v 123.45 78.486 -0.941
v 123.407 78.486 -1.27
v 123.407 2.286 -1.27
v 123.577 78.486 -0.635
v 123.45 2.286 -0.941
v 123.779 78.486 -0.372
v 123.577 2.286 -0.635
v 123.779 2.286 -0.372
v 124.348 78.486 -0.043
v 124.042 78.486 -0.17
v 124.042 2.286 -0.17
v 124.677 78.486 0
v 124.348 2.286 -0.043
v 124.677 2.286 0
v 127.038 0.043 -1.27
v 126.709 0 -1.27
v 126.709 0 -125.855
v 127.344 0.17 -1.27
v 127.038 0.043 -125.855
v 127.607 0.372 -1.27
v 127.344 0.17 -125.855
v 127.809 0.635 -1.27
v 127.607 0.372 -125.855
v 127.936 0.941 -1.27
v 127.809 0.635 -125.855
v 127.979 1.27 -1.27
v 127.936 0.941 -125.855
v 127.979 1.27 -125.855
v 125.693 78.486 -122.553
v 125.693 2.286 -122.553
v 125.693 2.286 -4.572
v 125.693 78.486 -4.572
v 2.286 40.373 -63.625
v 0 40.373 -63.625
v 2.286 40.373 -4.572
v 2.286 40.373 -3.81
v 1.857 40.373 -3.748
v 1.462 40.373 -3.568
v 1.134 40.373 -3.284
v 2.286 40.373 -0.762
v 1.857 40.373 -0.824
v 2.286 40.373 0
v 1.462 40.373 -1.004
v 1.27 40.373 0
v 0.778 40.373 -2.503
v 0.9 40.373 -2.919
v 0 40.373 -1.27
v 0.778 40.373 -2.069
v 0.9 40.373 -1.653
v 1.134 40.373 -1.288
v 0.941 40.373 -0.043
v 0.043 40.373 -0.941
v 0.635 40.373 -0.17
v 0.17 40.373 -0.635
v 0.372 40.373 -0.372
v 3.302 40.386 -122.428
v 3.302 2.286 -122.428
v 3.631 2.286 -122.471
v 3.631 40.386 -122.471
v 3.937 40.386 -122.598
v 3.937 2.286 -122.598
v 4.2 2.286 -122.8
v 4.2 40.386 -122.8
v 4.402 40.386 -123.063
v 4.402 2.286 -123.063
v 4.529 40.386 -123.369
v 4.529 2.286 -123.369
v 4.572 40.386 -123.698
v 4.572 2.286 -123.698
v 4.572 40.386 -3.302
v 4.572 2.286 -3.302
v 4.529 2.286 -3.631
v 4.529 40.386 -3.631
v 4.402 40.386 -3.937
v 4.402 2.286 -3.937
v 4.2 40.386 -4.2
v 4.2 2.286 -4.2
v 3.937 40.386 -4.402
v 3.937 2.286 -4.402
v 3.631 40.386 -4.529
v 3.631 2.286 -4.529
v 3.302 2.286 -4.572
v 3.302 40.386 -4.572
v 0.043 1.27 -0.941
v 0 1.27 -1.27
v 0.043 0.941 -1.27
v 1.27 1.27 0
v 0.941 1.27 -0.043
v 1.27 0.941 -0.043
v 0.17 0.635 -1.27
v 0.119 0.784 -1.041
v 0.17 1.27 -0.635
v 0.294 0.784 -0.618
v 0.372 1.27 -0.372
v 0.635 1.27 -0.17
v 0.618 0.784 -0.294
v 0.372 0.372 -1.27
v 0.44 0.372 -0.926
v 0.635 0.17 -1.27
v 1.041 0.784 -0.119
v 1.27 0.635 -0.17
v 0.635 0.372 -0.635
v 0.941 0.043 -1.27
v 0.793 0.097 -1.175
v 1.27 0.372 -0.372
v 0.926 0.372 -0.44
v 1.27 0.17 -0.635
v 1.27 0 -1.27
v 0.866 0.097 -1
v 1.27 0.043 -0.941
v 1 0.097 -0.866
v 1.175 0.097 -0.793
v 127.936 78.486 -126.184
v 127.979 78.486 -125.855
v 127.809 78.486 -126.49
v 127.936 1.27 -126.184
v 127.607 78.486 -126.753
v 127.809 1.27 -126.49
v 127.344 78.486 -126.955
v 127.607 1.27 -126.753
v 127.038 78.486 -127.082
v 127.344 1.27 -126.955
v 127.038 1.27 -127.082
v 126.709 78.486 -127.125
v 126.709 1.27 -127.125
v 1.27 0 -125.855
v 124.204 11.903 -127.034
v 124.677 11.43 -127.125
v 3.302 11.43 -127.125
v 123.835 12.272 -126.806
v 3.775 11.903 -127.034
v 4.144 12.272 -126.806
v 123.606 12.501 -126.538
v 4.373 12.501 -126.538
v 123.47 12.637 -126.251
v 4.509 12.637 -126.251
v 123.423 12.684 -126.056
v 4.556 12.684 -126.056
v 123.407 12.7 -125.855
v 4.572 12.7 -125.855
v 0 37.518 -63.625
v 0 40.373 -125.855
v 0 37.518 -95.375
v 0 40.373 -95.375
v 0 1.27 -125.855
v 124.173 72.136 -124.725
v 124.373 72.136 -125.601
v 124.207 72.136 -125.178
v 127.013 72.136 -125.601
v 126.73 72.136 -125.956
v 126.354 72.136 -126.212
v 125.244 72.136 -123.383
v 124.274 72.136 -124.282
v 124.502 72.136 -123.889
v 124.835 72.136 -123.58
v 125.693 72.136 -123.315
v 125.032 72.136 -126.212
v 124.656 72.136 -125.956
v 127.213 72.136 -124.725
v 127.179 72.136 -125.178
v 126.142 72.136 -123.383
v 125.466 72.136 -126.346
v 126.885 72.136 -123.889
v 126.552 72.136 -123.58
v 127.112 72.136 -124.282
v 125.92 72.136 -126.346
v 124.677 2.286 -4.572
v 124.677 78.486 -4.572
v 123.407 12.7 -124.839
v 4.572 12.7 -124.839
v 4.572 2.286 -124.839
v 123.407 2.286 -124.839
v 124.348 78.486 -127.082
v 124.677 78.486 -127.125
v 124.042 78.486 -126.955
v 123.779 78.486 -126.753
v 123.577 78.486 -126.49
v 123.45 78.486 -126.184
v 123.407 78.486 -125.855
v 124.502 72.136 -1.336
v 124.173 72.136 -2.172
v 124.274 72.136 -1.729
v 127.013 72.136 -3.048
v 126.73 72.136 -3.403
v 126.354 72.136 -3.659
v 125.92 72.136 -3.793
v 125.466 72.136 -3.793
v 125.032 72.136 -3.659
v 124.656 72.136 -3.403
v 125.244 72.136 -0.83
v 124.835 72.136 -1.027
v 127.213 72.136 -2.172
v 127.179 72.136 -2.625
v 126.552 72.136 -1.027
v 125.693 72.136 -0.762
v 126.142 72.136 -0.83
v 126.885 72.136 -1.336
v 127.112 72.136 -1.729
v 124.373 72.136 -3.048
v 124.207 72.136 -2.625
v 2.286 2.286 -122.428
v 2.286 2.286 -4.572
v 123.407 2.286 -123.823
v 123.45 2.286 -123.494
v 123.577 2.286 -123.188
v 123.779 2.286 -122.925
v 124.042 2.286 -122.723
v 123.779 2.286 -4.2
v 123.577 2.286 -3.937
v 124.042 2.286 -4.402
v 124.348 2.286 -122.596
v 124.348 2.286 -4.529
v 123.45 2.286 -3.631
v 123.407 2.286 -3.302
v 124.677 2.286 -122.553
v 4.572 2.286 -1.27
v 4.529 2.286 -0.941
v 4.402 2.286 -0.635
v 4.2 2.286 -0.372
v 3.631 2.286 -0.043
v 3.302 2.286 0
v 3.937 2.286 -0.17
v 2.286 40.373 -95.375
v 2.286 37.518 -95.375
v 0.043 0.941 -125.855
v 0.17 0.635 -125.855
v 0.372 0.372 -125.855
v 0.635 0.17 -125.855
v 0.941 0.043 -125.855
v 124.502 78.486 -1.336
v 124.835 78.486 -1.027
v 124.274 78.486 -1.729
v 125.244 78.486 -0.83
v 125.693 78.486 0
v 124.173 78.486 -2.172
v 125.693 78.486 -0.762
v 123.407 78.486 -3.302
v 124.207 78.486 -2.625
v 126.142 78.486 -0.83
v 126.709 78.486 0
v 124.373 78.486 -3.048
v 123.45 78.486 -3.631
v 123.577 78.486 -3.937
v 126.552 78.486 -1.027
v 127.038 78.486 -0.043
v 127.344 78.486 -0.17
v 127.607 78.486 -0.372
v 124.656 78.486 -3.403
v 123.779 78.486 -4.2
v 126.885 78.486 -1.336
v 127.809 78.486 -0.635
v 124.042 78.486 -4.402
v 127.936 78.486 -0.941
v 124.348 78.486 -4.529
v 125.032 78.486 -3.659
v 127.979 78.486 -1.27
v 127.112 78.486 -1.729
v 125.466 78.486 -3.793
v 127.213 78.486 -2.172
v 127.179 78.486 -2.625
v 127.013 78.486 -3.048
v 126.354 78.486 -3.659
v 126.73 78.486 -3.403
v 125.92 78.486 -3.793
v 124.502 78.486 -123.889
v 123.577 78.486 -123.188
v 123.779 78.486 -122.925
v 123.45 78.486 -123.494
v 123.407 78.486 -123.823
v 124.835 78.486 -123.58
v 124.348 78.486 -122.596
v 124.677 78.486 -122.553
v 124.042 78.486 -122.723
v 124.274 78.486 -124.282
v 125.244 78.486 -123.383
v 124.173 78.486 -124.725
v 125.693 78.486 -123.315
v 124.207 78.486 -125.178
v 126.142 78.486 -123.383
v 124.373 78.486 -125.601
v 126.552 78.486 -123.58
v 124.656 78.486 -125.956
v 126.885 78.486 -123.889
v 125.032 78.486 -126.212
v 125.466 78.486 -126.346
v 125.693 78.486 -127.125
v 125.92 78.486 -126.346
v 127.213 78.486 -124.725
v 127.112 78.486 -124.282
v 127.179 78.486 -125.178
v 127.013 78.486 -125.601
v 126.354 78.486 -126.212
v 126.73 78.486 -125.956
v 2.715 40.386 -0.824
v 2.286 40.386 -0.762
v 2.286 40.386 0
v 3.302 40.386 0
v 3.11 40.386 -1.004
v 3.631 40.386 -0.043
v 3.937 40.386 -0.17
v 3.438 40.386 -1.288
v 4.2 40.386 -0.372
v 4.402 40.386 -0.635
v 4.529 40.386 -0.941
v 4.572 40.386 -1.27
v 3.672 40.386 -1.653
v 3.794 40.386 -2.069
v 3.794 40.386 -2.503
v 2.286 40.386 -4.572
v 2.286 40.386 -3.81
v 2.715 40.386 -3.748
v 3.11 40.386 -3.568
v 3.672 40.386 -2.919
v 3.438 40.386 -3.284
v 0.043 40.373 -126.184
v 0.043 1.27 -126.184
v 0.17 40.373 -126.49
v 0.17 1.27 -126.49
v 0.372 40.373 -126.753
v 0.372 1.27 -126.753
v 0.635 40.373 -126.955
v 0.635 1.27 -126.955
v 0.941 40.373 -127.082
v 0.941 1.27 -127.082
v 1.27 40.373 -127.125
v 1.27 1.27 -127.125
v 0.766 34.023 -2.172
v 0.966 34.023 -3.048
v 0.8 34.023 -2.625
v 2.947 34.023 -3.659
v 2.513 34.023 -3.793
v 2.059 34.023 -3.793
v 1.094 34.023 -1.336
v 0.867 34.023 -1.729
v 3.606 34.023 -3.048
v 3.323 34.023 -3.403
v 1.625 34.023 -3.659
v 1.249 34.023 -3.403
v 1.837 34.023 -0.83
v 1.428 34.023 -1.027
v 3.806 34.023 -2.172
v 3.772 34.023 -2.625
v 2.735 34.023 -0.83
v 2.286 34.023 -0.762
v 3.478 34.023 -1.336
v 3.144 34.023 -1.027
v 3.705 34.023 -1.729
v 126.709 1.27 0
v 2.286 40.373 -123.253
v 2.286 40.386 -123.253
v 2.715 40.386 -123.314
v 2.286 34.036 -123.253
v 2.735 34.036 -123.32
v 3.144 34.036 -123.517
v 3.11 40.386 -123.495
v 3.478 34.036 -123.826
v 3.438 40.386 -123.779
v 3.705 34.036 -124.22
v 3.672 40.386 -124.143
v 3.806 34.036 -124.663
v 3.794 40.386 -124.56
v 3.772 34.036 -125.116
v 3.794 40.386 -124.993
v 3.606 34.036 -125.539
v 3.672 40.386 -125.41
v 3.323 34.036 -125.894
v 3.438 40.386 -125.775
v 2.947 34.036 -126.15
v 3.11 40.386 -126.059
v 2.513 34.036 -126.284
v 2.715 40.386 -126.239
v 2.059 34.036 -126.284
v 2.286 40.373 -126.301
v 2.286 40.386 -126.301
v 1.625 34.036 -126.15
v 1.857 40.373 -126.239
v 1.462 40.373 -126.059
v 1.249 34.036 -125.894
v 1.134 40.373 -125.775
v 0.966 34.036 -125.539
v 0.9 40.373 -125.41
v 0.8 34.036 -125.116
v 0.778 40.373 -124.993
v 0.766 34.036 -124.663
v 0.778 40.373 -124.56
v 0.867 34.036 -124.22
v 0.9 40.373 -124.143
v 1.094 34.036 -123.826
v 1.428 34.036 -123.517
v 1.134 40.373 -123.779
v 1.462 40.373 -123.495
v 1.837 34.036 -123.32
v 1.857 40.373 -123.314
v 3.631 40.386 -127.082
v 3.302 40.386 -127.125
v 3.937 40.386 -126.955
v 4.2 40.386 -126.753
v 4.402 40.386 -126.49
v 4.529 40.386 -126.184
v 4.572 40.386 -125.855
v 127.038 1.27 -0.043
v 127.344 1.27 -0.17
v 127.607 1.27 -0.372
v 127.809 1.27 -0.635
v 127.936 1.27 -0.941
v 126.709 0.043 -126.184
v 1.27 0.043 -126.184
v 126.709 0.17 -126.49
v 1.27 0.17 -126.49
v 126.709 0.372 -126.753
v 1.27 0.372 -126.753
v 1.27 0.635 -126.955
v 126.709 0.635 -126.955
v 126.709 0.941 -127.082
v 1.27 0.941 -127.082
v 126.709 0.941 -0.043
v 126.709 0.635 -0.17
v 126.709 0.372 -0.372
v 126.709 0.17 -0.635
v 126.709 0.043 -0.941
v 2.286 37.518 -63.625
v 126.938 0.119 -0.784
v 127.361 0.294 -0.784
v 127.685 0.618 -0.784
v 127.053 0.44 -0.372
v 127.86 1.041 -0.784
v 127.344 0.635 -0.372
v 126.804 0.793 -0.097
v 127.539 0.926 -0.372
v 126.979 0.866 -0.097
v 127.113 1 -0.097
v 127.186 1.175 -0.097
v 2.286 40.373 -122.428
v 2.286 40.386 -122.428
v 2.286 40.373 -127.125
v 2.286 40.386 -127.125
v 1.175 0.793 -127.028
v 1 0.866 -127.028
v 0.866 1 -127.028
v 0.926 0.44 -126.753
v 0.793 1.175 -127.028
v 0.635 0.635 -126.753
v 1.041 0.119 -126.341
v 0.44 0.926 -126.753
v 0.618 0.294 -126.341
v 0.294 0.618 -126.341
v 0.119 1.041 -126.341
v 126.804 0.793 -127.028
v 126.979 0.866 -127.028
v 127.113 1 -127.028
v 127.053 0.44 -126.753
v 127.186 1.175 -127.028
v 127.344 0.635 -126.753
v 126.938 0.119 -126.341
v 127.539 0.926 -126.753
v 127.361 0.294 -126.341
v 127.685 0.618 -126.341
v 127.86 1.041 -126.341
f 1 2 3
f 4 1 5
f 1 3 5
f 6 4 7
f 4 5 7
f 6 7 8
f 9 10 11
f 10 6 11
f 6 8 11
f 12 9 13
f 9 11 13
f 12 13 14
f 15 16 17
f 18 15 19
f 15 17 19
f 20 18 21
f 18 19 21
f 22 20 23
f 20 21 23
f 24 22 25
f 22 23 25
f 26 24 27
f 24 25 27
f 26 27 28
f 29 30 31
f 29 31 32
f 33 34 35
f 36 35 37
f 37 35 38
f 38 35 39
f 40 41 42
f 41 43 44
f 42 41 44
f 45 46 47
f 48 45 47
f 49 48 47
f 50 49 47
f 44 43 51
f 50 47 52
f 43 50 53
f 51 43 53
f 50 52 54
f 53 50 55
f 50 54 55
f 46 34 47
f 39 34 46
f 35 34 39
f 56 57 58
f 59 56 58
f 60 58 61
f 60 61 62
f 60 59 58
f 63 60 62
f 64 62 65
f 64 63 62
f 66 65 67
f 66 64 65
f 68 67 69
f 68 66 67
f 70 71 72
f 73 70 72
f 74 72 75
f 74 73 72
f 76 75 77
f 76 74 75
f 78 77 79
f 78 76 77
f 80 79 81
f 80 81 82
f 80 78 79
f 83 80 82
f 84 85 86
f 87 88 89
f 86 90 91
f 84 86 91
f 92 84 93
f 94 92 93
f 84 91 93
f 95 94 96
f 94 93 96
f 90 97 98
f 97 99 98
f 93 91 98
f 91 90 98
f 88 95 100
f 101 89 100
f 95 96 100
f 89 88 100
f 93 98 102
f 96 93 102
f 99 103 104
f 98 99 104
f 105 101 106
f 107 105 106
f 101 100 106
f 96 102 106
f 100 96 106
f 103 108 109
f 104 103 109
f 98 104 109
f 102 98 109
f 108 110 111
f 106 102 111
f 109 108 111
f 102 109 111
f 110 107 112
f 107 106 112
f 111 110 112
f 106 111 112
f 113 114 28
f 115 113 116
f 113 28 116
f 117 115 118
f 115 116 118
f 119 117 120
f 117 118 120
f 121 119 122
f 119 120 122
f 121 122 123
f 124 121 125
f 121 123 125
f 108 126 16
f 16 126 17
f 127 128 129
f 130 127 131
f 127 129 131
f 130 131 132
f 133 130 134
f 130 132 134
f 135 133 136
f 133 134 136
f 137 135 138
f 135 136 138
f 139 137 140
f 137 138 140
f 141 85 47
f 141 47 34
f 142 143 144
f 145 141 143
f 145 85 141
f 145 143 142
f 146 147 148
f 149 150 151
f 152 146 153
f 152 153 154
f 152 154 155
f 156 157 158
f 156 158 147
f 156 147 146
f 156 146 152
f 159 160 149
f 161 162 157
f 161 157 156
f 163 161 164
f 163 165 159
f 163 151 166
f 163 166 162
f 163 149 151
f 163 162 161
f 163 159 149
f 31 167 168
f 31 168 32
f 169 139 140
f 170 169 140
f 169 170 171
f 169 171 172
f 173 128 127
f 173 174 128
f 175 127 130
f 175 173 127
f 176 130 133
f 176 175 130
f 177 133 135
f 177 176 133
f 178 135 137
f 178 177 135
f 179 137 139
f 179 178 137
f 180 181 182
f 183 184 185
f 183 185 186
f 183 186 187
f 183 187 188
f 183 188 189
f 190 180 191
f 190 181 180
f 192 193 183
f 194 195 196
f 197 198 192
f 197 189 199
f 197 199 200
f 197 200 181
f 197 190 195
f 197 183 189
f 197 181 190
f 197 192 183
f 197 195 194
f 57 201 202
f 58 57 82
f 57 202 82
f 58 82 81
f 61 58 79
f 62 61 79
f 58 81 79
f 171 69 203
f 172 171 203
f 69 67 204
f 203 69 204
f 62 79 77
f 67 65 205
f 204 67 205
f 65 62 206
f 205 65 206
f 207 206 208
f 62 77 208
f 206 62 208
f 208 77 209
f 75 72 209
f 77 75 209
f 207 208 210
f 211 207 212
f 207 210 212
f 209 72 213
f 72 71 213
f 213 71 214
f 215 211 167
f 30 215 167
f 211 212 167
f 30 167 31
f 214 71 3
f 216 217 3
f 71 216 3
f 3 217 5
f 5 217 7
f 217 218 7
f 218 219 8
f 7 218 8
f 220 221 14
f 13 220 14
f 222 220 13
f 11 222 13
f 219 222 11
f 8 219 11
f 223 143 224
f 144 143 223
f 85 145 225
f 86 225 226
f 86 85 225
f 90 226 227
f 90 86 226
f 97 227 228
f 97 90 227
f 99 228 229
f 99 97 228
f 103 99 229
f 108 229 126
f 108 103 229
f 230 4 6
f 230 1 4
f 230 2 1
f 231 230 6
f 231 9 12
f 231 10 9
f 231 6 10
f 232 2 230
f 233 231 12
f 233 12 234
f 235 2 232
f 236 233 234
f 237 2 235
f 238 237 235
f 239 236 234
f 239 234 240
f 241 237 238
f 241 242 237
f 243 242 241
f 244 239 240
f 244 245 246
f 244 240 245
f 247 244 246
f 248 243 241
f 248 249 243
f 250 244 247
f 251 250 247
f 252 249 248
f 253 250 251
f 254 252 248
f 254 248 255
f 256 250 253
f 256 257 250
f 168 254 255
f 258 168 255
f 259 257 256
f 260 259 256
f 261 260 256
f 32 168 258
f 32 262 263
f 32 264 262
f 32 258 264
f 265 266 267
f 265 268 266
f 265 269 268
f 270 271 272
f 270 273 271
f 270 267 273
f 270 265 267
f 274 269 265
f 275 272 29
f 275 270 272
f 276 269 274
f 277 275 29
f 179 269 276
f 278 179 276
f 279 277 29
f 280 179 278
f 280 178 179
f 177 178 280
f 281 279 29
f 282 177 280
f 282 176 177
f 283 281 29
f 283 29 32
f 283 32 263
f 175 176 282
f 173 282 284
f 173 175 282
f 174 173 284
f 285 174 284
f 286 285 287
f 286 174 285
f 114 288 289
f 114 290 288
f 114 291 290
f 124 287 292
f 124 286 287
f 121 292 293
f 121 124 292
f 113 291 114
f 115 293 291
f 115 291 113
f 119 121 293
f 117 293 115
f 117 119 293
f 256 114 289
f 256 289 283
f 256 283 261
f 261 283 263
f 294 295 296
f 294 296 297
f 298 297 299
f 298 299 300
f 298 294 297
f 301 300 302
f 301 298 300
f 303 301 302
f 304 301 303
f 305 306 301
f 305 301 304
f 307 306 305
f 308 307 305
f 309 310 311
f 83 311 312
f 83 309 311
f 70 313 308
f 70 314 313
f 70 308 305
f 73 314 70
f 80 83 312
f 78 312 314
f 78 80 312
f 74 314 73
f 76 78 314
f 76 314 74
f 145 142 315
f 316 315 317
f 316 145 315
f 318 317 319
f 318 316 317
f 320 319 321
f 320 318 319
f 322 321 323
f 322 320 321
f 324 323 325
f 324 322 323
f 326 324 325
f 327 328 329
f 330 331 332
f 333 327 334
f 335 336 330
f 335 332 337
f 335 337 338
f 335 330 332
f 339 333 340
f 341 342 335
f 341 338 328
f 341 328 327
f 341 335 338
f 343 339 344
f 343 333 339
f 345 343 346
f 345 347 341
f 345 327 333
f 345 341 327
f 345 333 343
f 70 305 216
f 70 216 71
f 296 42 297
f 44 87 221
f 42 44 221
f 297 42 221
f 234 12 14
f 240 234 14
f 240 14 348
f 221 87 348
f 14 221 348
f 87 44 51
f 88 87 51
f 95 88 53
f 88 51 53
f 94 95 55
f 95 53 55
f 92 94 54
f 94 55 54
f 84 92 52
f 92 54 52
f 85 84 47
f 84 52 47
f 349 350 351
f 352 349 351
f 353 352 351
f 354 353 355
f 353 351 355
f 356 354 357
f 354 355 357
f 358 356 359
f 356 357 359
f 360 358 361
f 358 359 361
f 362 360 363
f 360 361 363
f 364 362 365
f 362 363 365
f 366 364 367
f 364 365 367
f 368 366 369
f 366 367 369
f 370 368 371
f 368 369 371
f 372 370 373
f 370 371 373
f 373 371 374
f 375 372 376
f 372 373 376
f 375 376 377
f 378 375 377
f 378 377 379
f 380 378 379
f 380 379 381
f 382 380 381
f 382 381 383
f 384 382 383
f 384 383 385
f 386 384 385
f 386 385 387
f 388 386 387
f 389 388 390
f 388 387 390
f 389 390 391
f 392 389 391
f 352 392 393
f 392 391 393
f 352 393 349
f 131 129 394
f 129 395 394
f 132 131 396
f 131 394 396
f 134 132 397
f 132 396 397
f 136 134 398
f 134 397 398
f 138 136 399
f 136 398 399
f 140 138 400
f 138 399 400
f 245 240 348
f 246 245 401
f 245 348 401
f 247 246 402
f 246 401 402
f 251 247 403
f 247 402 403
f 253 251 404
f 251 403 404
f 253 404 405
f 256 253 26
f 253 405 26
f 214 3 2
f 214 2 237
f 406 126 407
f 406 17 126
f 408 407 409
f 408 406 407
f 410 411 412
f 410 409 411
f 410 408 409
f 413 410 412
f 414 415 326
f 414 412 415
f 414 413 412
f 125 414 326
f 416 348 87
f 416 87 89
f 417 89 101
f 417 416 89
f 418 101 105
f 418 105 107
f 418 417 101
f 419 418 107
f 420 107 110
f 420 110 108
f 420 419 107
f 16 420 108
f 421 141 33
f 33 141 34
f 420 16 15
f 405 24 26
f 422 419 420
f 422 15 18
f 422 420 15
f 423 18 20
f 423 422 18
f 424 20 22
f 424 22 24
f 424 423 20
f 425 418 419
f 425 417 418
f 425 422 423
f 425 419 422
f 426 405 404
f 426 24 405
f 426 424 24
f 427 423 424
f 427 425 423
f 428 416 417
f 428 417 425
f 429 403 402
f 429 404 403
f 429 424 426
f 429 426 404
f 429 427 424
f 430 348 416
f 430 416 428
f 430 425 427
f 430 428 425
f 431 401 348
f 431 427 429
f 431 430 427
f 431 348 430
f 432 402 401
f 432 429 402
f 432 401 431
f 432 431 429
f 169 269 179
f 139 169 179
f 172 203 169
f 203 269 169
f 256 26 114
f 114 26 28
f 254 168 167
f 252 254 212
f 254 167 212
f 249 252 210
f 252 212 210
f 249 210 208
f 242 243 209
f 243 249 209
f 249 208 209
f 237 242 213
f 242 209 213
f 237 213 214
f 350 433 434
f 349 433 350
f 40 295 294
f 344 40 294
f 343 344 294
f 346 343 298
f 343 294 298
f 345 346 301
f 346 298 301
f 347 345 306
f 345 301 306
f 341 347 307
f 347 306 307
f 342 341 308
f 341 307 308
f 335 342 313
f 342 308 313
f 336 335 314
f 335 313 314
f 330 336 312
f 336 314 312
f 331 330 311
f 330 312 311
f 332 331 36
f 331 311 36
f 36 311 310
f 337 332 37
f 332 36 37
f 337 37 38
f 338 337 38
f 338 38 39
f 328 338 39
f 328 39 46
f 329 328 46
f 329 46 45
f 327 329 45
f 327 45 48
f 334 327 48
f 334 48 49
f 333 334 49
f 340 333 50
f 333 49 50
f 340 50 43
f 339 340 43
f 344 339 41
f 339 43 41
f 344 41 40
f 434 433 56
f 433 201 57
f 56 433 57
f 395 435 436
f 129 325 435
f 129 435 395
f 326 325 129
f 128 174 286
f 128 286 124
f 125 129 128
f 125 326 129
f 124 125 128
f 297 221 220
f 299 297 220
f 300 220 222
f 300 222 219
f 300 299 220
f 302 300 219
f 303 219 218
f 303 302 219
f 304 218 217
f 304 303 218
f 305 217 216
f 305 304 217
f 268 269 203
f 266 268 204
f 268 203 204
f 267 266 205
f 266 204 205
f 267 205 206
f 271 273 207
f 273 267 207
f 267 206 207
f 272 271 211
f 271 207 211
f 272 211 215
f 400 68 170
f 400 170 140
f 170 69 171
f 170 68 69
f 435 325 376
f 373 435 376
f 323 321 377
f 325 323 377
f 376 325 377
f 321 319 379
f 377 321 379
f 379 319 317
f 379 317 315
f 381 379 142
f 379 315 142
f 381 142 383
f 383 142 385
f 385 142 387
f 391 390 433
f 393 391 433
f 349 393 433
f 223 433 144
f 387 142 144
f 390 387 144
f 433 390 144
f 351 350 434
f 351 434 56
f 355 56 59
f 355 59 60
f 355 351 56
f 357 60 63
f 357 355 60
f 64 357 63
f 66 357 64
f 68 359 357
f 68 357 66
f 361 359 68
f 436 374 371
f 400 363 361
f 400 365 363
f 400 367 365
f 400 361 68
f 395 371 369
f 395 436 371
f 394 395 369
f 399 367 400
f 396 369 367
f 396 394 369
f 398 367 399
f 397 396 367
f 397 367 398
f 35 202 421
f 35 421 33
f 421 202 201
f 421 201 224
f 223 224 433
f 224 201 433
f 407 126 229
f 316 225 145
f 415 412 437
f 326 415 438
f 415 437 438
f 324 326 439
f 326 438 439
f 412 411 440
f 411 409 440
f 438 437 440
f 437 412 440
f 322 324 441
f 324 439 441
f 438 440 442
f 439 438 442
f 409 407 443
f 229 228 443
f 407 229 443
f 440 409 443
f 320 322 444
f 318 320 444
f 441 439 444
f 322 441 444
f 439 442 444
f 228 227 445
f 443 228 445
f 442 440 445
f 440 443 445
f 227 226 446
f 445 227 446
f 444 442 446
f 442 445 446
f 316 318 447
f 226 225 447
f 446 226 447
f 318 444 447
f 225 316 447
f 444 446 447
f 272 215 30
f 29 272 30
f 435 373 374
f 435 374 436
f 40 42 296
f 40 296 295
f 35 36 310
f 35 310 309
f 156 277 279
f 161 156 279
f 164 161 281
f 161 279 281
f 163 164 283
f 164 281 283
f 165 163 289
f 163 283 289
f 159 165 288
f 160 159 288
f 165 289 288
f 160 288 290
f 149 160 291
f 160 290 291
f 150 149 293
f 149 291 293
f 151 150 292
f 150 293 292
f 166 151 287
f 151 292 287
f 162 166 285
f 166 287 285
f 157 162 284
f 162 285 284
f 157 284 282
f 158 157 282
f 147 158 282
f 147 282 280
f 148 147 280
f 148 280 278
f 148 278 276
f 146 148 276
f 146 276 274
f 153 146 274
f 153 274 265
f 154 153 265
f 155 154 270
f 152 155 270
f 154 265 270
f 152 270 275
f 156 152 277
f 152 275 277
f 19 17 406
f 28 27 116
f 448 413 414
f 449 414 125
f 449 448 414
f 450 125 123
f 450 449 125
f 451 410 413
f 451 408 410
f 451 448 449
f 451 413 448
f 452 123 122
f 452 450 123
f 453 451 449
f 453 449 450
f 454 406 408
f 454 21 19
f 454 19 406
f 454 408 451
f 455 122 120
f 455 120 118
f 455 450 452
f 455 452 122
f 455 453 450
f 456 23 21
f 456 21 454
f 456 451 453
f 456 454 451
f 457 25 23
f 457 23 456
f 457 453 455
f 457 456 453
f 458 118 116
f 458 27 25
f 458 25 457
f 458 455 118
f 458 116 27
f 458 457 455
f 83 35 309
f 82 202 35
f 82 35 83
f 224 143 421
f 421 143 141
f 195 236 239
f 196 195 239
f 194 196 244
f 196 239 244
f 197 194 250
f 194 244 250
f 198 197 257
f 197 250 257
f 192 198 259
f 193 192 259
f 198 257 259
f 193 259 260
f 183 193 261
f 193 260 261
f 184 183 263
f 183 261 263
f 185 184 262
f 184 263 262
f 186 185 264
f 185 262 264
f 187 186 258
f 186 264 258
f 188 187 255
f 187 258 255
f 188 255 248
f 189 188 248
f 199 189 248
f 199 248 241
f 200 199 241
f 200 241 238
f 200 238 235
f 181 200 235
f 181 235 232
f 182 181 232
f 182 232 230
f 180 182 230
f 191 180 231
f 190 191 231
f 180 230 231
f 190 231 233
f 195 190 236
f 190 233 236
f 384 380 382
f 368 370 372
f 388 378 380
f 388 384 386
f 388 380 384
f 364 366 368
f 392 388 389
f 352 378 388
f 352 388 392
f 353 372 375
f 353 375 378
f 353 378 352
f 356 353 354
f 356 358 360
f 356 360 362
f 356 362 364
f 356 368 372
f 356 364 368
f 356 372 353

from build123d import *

# Parameters (mm, degrees)
SKETCH1_W                = 127.979014886
SKETCH1_H                = 127.125142163
BOSS_EXTRUDE1_DEPTH      = 2.286
SKETCH2_W                = 127.979014886
SKETCH2_H                = 127.125142163
BOSS_EXTRUDE2_DEPTH      = 76.2
SKETCH4_W                = 123.407014886
SKETCH4_H                = 122.553142163
CUT_EXTRUDE2_DEPTH       = 76.2
SKETCH5_W                = 123.407014886
SKETCH5_H                = 76.2
CUT_EXTRUDE3_DEPTH       = 2.286
SKETCH6_W                = 123.407014886
SKETCH6_H                = 65.786
CUT_EXTRUDE4_DEPTH       = 2.286
SKETCH7_W                = 127.125142163
SKETCH7_H                = 38.112983868
CUT_EXTRUDE5_DEPTH       = 2.286
SKETCH8_W                = 31.75
SKETCH8_H                = 2.854777597
CUT_EXTRUDE6_DEPTH       = 2.54
SKETCH9_W                = 2.286
SKETCH9_H                = 4.572
BOSS_EXTRUDE3_DEPTH      = 76.2
SKETCH11_W               = 2.286
SKETCH11_H               = 4.572
BOSS_EXTRUDE5_DEPTH      = 38.1
BOSS_EXTRUDE6_DEPTH      = 27.686
BOSS_EXTRUDE6_DEPTH_BACK = 10.414
SKETCH12_W               = 2.286
SKETCH12_H               = 4.697142163
BOSS_EXTRUDE7_DEPTH      = 65.786
BOSS_EXTRUDE7_DEPTH_BACK = 10.414
SKETCH13_W               = 2.286
SKETCH13_H               = 4.572
SKETCH14_R               = 1.524
CUT_EXTRUDE7_DEPTH       = 6.35
SKETCH15_R               = 1.524
CUT_EXTRUDE8_DEPTH       = 6.35
SKETCH16_R               = 1.524
CUT_EXTRUDE9_DEPTH       = 6.35
SKETCH18_R               = 1.524
CUT_EXTRUDE10_DEPTH      = 6.35
SKETCH19_R               = 1.524
CUT_EXTRUDE11_DEPTH      = 6.35
FILLET1_R                = 1.27
FILLET2_R                = 1.27
FILLET7_R                = 1.27
FILLET8_R                = 1.27


with BuildPart() as part:
    # Sketch1 → Boss-Extrude1 (new body)
    with BuildSketch(Plane(origin=(0, 0, 0), x_dir=(1, 0, 0), z_dir=(0, 1, 0))):
        with Locations((63.989507443, 63.562571082)):
            Rectangle(SKETCH1_W, SKETCH1_H)
    extrude(amount=BOSS_EXTRUDE1_DEPTH)

    # Sketch2 → Boss-Extrude2 (add)
    with BuildSketch(Plane(origin=(0, 2.286, 0), x_dir=(1, 0, 0), z_dir=(0, 1, 0))):
        with Locations((63.989507443, 63.562571082)):
            Rectangle(SKETCH2_W, SKETCH2_H)
    extrude(amount=BOSS_EXTRUDE2_DEPTH)

    # Sketch4 → Cut-Extrude2 (cut)
    with BuildSketch(Plane(origin=(0, 78.486, 0), x_dir=(1, 0, 0), z_dir=(0, 1, 0))):
        with Locations((63.989507443, 63.562571082)):
            Rectangle(SKETCH4_W, SKETCH4_H)
    extrude(amount=-CUT_EXTRUDE2_DEPTH, mode=Mode.SUBTRACT)

    # Sketch5 → Cut-Extrude3 (cut)
    with BuildSketch(Plane.XY):
        with Locations((63.989507443, 40.386)):
            Rectangle(SKETCH5_W, SKETCH5_H)
    extrude(amount=-CUT_EXTRUDE3_DEPTH, mode=Mode.SUBTRACT)

    # Sketch6 → Cut-Extrude4 (cut)
    with BuildSketch(Plane(origin=(0, 0, -127.125142163), x_dir=(-1, 0, 0), z_dir=(0, 0, -1))):
        with Locations((-63.989507443, 45.593)):
            Rectangle(SKETCH6_W, SKETCH6_H)
    extrude(amount=-CUT_EXTRUDE4_DEPTH, mode=Mode.SUBTRACT)

    # Sketch7 → Cut-Extrude5 (cut)
    with BuildSketch(Plane.ZY):
        with Locations((-63.562571082, 59.429508066)):
            Rectangle(SKETCH7_W, SKETCH7_H)
    extrude(amount=-CUT_EXTRUDE5_DEPTH, mode=Mode.SUBTRACT)

    # Sketch8 → Cut-Extrude6 (cut)
    with BuildSketch(Plane.ZY):
        with Locations((-79.500142163, 38.945627333)):
            Rectangle(SKETCH8_W, SKETCH8_H)
    extrude(amount=-CUT_EXTRUDE6_DEPTH, mode=Mode.SUBTRACT)

    # Sketch9 → Boss-Extrude3 (add)
    with BuildSketch(Plane(origin=(0, 2.286, 0), x_dir=(1, 0, 0), z_dir=(0, 1, 0))):
        with Locations((124.550014886, 2.286)):
            Rectangle(SKETCH9_W, SKETCH9_H)
    extrude(amount=BOSS_EXTRUDE3_DEPTH)

    # Sketch11 → Boss-Extrude5 (add)
    with BuildSketch(Plane(origin=(0, 2.286, 0), x_dir=(1, 0, 0), z_dir=(0, 1, 0))):
        with Locations((3.429, 2.286)):
            Rectangle(SKETCH11_W, SKETCH11_H)
    extrude(amount=BOSS_EXTRUDE5_DEPTH)

    # Sketch12 → Boss-Extrude6 (add, two sides: drawn at the far end of the back side and taken through both)
    with BuildSketch(Plane(origin=(0, 12.7, 0), x_dir=(1, 0, 0), z_dir=(0, 1, 0)).offset(-BOSS_EXTRUDE6_DEPTH_BACK)):
        with Locations((3.429, 124.776571082)):
            Rectangle(SKETCH12_W, SKETCH12_H)
    extrude(amount=BOSS_EXTRUDE6_DEPTH + BOSS_EXTRUDE6_DEPTH_BACK)

    # Sketch13 → Boss-Extrude7 (add, two sides: drawn at the far end of the back side and taken through both)
    with BuildSketch(Plane(origin=(0, 12.7, 0), x_dir=(1, 0, 0), z_dir=(0, 1, 0)).offset(-BOSS_EXTRUDE7_DEPTH_BACK)):
        with Locations((124.550014886, 124.839142163)):
            Rectangle(SKETCH13_W, SKETCH13_H)
    extrude(amount=BOSS_EXTRUDE7_DEPTH + BOSS_EXTRUDE7_DEPTH_BACK)

    # Sketch14 → Cut-Extrude7 (cut)
    with BuildSketch(Plane(origin=(0, 78.486, 0), x_dir=(1, 0, 0), z_dir=(0, 1, 0))):
        with Locations(Location((125.693014886, 2.286, 0), (0, 0, 270))):
            Circle(SKETCH14_R)
    extrude(amount=-CUT_EXTRUDE7_DEPTH, mode=Mode.SUBTRACT)

    # Sketch15 → Cut-Extrude8 (cut)
    with BuildSketch(Plane(origin=(0, 78.486, 0), x_dir=(1, 0, 0), z_dir=(0, 1, 0))):
        with Locations(Location((125.693014886, 124.839142163, 0), (0, 0, 270))):
            Circle(SKETCH15_R)
    extrude(amount=-CUT_EXTRUDE8_DEPTH, mode=Mode.SUBTRACT)

    # Sketch16 → Cut-Extrude9 (cut)
    with BuildSketch(Plane(origin=(0, 40.373016132, 0), x_dir=(1, 0, 0), z_dir=(0, 1, 0))):
        with Locations(Location((2.286, 2.286, 0), (0, 0, 270))):
            Circle(SKETCH16_R)
    extrude(amount=-CUT_EXTRUDE9_DEPTH, mode=Mode.SUBTRACT)

    # Sketch18 → Cut-Extrude10 (cut)
    with BuildSketch(Plane(origin=(0, 40.386, 0), x_dir=(1, 0, 0), z_dir=(0, 1, 0))):
        with Locations(Location((2.286, 2.286, 0), (0, 0, 270))):
            Circle(SKETCH18_R)
    extrude(amount=-CUT_EXTRUDE10_DEPTH, mode=Mode.SUBTRACT)

    # Sketch19 → Cut-Extrude11 (cut)
    with BuildSketch(Plane(origin=(0, 40.386, 0), x_dir=(1, 0, 0), z_dir=(0, 1, 0))):
        with Locations(Location((2.286, 124.776571082, 0), (0, 0, 270))):
            Circle(SKETCH19_R)
    extrude(amount=-CUT_EXTRUDE11_DEPTH, mode=Mode.SUBTRACT)

    # Fillet1
    fillet1_edges = [part.edges().sort_by_distance(p)[0] for p in [
        (0, 20.186508066, 0),
    ]]
    fillet(fillet1_edges, radius=FILLET1_R)

    # Fillet2
    fillet2_edges = [part.edges().sort_by_distance(p)[0] for p in [
        (4.572, 21.336, 0),
        (4.572, 21.336, -4.572),
        (4.572, 26.543, -127.125142163),
        (63.989507443, 12.7, -127.125142163),
        (123.407014886, 45.593, -127.125142163),
        (64.624507443, 0, 0),
        (0, 0, -64.197571082),
        (0.371974388, 0, -0.371974388),
        (127.979014886, 0, -63.562571082),
        (63.989507443, 0, -127.125142163),
        (0, 20.186508066, -127.125142163),
        (127.979014886, 39.243, -127.125142163),
    ]]
    fillet(fillet2_edges, radius=FILLET2_R)

    # Fillet7
    fillet7_edges = [part.edges().sort_by_distance(p)[0] for p in [
        (4.572, 21.336, -122.428),
    ]]
    fillet(fillet7_edges, radius=FILLET7_R)

    # Fillet8
    # the kernel refuses this fillet: 1.27 mm, written as the material it takes off along each edge
    with BuildSketch(Plane(origin=(126.709014886, 1.27, -1.27), x_dir=(1, 0, 0), z_dir=(0, 0, 1))) as fillet8_piece_1_section:
        Polygon((0, 0), (FILLET8_R, 0), (FILLET8_R, -FILLET8_R), (0, -FILLET8_R), align=None)
    fillet8_piece_1 = extrude(amount=FILLET8_R, mode=Mode.PRIVATE)
    fillet8_piece_1 = fillet8_piece_1 - Plane(origin=(126.709014886, 1.27, -1.27), x_dir=(-0.7071067811865475, 0.7071067811865475, 0), z_dir=(0, 0, 1)) * Sphere(FILLET8_R, mode=Mode.PRIVATE)
    add(fillet8_piece_1, mode=Mode.SUBTRACT)
    with BuildSketch(Plane(origin=(123.407014886, 2.286, -4.572), x_dir=(1, 0, 0), z_dir=(0, 1, 0)), Plane(origin=(123.407014886, 2.286, 0), x_dir=(0, 0, -1), z_dir=(0, 1, 0)), Plane(origin=(123.407014886, 2.286, -122.553142163), x_dir=(0, 0, -1), z_dir=(0, 1, 0))) as fillet8_piece_2:
        with BuildLine():
            CenterArc((FILLET8_R, -FILLET8_R), FILLET8_R, 90, 90)
            Line((0, -FILLET8_R), (0, 0))
            Line((0, 0), (FILLET8_R, 0))
        make_face()
    extrude(amount=79.375, mode=Mode.SUBTRACT)
    with BuildSketch(Plane(origin=(127.979014886, 1.27, 0), x_dir=(-1, 0, 0), z_dir=(0, 1, 0))) as fillet8_piece_3:
        with BuildLine():
            CenterArc((FILLET8_R, -FILLET8_R), FILLET8_R, 90, 90)
            Line((0, -FILLET8_R), (0, 0))
            Line((0, 0), (FILLET8_R, 0))
        make_face()
    extrude(amount=80.391, mode=Mode.SUBTRACT)


solid = part.part
